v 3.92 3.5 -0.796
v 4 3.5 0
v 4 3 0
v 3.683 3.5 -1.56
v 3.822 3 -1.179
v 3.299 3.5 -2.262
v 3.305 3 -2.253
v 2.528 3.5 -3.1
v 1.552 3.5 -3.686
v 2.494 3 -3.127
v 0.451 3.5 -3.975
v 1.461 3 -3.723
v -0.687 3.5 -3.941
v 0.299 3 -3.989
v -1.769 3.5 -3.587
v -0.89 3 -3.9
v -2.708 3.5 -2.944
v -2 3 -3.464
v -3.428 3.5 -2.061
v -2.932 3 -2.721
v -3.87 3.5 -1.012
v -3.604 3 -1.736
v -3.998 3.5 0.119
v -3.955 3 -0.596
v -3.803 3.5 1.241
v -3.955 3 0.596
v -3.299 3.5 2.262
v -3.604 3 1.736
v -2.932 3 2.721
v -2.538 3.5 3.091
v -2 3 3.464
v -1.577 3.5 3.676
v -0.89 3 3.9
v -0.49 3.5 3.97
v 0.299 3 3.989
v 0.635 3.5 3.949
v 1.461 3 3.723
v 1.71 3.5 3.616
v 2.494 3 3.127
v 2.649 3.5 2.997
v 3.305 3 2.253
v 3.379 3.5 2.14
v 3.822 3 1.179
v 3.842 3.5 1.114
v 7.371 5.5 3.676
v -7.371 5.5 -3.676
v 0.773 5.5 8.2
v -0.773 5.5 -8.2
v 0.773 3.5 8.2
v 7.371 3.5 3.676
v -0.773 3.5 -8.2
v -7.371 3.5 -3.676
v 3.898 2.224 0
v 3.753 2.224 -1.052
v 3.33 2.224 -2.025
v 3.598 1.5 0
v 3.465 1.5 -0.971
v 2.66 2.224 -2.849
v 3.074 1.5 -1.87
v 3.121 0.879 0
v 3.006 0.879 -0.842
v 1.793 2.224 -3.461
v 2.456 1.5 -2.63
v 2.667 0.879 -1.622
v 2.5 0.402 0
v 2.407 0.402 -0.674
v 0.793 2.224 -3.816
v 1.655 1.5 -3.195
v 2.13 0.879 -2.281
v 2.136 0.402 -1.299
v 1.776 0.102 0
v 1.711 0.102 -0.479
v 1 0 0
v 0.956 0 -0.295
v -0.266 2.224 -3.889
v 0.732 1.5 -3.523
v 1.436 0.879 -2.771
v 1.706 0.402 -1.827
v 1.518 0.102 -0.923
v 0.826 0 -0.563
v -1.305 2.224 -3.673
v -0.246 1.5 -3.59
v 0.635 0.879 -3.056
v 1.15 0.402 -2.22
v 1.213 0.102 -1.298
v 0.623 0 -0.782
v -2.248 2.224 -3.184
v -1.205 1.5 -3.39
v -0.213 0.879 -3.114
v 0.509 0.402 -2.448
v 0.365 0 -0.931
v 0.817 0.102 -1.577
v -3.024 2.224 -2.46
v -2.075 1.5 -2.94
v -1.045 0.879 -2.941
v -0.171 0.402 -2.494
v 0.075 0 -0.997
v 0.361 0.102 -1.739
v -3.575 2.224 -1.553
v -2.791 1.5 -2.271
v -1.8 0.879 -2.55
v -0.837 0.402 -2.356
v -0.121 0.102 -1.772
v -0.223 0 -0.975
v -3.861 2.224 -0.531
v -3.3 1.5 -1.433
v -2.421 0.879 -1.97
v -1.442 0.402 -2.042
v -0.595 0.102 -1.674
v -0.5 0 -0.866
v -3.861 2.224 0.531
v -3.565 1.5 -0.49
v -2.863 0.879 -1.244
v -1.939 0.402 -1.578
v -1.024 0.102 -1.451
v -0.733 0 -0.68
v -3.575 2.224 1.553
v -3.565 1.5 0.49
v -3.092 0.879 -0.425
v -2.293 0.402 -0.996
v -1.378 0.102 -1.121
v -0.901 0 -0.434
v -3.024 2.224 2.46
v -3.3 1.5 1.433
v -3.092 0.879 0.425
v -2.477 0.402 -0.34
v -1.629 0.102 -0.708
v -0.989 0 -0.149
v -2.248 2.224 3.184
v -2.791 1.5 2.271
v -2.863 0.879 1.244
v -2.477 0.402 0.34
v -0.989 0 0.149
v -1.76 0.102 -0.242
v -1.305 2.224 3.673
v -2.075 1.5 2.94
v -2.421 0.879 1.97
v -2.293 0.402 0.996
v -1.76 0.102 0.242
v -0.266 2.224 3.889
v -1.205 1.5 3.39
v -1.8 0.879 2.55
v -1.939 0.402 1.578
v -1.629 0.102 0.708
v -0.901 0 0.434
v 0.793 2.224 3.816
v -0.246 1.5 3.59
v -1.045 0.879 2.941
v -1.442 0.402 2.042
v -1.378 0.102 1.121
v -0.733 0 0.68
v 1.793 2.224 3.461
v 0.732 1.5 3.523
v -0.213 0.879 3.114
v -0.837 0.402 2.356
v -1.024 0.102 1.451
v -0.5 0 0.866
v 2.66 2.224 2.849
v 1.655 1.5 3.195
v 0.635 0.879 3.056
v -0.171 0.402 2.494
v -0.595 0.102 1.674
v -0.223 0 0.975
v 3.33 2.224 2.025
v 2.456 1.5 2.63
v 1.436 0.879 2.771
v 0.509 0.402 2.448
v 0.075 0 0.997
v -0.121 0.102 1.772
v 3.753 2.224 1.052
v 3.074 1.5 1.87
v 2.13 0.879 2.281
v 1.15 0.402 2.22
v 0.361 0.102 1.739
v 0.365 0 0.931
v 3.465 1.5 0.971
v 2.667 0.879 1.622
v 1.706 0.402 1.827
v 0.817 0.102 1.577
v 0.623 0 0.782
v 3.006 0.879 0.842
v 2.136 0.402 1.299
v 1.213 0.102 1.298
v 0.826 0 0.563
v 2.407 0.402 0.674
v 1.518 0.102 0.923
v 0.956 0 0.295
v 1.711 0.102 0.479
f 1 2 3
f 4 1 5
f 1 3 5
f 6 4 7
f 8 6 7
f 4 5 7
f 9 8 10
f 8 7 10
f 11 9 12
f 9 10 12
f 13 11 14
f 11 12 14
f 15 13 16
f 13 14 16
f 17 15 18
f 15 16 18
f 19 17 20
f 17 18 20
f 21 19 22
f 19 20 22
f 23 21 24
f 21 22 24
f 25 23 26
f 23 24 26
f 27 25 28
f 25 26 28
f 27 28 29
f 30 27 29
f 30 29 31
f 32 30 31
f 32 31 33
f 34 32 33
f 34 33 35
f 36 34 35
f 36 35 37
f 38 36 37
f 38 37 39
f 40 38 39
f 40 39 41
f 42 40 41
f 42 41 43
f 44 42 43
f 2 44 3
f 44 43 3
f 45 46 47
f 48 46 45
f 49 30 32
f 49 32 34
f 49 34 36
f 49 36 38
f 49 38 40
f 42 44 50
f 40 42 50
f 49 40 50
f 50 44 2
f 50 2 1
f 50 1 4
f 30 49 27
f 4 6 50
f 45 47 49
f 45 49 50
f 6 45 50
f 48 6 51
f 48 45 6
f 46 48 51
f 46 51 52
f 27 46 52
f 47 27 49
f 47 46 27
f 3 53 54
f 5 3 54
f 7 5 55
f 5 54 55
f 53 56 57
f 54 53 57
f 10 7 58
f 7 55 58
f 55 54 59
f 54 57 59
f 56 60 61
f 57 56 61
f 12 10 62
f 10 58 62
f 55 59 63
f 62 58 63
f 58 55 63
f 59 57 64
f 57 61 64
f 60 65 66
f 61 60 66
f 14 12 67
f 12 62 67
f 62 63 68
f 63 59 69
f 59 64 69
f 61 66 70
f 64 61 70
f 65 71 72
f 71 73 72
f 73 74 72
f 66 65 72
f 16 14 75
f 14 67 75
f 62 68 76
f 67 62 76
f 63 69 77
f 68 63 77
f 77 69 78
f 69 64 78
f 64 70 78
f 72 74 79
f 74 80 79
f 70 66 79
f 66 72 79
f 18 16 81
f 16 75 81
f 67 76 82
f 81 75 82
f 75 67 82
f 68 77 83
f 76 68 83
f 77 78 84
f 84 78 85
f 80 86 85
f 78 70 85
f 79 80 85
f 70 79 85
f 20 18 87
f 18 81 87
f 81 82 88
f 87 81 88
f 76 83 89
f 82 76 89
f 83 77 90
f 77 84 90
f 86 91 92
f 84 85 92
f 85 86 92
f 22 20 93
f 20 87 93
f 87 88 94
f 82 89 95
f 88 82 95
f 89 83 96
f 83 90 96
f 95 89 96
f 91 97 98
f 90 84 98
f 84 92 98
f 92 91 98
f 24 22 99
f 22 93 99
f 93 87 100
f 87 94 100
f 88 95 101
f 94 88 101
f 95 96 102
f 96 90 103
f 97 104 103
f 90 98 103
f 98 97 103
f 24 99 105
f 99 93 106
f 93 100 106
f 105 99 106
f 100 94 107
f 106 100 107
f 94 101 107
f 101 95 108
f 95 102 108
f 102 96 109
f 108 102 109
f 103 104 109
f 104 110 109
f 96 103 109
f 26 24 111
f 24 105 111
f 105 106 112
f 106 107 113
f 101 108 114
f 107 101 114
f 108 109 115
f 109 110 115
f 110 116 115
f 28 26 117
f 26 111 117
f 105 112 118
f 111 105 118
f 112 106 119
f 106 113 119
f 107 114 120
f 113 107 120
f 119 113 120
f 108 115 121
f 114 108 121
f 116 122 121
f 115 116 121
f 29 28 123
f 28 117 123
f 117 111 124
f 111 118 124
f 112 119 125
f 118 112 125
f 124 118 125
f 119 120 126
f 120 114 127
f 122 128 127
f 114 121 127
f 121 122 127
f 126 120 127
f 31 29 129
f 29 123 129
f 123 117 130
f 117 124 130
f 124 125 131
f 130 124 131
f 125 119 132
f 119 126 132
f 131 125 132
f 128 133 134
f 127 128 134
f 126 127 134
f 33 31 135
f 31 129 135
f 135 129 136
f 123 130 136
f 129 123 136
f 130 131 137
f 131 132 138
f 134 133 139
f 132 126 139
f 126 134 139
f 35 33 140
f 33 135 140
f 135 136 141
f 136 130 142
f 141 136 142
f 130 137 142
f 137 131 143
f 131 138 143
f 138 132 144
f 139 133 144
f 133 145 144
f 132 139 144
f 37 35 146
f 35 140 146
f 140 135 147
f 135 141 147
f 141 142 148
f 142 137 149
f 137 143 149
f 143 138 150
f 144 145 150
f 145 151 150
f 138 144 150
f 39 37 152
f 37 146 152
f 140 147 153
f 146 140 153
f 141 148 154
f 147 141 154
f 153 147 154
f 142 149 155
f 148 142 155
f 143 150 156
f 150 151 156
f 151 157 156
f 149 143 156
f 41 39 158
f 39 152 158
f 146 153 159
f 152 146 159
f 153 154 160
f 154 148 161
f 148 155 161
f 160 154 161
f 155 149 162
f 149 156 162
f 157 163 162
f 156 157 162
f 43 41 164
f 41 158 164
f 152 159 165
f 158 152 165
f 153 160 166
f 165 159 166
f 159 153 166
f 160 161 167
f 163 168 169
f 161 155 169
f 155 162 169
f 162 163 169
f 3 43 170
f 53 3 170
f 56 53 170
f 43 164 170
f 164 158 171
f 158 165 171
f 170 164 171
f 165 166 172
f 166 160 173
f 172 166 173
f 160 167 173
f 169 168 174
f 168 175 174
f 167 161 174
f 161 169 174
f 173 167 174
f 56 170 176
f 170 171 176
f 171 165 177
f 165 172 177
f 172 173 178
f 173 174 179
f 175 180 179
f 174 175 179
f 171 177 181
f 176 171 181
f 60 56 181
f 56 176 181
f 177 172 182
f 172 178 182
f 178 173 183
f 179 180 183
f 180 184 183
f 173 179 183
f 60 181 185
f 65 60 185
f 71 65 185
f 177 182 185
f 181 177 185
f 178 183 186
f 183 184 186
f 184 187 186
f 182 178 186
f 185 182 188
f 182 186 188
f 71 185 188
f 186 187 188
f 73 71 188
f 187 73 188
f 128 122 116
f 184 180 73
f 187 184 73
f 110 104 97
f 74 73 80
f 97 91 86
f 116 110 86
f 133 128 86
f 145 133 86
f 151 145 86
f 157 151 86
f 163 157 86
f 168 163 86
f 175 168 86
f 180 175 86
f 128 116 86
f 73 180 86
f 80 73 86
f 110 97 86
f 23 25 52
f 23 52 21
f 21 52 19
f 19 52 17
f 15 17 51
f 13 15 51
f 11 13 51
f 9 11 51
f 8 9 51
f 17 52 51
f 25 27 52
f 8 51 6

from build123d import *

# Parameters (mm, degrees)
SKETCH1_R           = 4
BOSS_EXTRUDE1_DEPTH = 5.5
BOSS_EXTRUDE2_DEPTH = 2
FILLET3_R           = 3


with BuildPart() as part:
    # Sketch1 → Boss-Extrude1 (new body)
    with BuildSketch(Plane(origin=(0, 0, 0), x_dir=(1, 0, 0), z_dir=(0, 1, 0))):
        Circle(SKETCH1_R)
    extrude(amount=BOSS_EXTRUDE1_DEPTH)

    # Sketch2 → Boss-Extrude2 (add)
    with BuildSketch(Plane(origin=(0, 5.5, 0), x_dir=(1, 0, 0), z_dir=(0, 1, 0))):
        Polygon((0.772583445, -8.200189926), (7.3705827, -3.676208734), (-0.772583445, 8.200189926), (-7.3705827, 3.676208734), align=None)
    extrude(amount=-BOSS_EXTRUDE2_DEPTH)

    # Fillet3
    fillet3_edges = [part.edges().sort_by_distance(p)[0] for p in [
        (-4, 0, 0),
    ]]
    fillet(fillet3_edges, radius=FILLET3_R)


solid = part.part
